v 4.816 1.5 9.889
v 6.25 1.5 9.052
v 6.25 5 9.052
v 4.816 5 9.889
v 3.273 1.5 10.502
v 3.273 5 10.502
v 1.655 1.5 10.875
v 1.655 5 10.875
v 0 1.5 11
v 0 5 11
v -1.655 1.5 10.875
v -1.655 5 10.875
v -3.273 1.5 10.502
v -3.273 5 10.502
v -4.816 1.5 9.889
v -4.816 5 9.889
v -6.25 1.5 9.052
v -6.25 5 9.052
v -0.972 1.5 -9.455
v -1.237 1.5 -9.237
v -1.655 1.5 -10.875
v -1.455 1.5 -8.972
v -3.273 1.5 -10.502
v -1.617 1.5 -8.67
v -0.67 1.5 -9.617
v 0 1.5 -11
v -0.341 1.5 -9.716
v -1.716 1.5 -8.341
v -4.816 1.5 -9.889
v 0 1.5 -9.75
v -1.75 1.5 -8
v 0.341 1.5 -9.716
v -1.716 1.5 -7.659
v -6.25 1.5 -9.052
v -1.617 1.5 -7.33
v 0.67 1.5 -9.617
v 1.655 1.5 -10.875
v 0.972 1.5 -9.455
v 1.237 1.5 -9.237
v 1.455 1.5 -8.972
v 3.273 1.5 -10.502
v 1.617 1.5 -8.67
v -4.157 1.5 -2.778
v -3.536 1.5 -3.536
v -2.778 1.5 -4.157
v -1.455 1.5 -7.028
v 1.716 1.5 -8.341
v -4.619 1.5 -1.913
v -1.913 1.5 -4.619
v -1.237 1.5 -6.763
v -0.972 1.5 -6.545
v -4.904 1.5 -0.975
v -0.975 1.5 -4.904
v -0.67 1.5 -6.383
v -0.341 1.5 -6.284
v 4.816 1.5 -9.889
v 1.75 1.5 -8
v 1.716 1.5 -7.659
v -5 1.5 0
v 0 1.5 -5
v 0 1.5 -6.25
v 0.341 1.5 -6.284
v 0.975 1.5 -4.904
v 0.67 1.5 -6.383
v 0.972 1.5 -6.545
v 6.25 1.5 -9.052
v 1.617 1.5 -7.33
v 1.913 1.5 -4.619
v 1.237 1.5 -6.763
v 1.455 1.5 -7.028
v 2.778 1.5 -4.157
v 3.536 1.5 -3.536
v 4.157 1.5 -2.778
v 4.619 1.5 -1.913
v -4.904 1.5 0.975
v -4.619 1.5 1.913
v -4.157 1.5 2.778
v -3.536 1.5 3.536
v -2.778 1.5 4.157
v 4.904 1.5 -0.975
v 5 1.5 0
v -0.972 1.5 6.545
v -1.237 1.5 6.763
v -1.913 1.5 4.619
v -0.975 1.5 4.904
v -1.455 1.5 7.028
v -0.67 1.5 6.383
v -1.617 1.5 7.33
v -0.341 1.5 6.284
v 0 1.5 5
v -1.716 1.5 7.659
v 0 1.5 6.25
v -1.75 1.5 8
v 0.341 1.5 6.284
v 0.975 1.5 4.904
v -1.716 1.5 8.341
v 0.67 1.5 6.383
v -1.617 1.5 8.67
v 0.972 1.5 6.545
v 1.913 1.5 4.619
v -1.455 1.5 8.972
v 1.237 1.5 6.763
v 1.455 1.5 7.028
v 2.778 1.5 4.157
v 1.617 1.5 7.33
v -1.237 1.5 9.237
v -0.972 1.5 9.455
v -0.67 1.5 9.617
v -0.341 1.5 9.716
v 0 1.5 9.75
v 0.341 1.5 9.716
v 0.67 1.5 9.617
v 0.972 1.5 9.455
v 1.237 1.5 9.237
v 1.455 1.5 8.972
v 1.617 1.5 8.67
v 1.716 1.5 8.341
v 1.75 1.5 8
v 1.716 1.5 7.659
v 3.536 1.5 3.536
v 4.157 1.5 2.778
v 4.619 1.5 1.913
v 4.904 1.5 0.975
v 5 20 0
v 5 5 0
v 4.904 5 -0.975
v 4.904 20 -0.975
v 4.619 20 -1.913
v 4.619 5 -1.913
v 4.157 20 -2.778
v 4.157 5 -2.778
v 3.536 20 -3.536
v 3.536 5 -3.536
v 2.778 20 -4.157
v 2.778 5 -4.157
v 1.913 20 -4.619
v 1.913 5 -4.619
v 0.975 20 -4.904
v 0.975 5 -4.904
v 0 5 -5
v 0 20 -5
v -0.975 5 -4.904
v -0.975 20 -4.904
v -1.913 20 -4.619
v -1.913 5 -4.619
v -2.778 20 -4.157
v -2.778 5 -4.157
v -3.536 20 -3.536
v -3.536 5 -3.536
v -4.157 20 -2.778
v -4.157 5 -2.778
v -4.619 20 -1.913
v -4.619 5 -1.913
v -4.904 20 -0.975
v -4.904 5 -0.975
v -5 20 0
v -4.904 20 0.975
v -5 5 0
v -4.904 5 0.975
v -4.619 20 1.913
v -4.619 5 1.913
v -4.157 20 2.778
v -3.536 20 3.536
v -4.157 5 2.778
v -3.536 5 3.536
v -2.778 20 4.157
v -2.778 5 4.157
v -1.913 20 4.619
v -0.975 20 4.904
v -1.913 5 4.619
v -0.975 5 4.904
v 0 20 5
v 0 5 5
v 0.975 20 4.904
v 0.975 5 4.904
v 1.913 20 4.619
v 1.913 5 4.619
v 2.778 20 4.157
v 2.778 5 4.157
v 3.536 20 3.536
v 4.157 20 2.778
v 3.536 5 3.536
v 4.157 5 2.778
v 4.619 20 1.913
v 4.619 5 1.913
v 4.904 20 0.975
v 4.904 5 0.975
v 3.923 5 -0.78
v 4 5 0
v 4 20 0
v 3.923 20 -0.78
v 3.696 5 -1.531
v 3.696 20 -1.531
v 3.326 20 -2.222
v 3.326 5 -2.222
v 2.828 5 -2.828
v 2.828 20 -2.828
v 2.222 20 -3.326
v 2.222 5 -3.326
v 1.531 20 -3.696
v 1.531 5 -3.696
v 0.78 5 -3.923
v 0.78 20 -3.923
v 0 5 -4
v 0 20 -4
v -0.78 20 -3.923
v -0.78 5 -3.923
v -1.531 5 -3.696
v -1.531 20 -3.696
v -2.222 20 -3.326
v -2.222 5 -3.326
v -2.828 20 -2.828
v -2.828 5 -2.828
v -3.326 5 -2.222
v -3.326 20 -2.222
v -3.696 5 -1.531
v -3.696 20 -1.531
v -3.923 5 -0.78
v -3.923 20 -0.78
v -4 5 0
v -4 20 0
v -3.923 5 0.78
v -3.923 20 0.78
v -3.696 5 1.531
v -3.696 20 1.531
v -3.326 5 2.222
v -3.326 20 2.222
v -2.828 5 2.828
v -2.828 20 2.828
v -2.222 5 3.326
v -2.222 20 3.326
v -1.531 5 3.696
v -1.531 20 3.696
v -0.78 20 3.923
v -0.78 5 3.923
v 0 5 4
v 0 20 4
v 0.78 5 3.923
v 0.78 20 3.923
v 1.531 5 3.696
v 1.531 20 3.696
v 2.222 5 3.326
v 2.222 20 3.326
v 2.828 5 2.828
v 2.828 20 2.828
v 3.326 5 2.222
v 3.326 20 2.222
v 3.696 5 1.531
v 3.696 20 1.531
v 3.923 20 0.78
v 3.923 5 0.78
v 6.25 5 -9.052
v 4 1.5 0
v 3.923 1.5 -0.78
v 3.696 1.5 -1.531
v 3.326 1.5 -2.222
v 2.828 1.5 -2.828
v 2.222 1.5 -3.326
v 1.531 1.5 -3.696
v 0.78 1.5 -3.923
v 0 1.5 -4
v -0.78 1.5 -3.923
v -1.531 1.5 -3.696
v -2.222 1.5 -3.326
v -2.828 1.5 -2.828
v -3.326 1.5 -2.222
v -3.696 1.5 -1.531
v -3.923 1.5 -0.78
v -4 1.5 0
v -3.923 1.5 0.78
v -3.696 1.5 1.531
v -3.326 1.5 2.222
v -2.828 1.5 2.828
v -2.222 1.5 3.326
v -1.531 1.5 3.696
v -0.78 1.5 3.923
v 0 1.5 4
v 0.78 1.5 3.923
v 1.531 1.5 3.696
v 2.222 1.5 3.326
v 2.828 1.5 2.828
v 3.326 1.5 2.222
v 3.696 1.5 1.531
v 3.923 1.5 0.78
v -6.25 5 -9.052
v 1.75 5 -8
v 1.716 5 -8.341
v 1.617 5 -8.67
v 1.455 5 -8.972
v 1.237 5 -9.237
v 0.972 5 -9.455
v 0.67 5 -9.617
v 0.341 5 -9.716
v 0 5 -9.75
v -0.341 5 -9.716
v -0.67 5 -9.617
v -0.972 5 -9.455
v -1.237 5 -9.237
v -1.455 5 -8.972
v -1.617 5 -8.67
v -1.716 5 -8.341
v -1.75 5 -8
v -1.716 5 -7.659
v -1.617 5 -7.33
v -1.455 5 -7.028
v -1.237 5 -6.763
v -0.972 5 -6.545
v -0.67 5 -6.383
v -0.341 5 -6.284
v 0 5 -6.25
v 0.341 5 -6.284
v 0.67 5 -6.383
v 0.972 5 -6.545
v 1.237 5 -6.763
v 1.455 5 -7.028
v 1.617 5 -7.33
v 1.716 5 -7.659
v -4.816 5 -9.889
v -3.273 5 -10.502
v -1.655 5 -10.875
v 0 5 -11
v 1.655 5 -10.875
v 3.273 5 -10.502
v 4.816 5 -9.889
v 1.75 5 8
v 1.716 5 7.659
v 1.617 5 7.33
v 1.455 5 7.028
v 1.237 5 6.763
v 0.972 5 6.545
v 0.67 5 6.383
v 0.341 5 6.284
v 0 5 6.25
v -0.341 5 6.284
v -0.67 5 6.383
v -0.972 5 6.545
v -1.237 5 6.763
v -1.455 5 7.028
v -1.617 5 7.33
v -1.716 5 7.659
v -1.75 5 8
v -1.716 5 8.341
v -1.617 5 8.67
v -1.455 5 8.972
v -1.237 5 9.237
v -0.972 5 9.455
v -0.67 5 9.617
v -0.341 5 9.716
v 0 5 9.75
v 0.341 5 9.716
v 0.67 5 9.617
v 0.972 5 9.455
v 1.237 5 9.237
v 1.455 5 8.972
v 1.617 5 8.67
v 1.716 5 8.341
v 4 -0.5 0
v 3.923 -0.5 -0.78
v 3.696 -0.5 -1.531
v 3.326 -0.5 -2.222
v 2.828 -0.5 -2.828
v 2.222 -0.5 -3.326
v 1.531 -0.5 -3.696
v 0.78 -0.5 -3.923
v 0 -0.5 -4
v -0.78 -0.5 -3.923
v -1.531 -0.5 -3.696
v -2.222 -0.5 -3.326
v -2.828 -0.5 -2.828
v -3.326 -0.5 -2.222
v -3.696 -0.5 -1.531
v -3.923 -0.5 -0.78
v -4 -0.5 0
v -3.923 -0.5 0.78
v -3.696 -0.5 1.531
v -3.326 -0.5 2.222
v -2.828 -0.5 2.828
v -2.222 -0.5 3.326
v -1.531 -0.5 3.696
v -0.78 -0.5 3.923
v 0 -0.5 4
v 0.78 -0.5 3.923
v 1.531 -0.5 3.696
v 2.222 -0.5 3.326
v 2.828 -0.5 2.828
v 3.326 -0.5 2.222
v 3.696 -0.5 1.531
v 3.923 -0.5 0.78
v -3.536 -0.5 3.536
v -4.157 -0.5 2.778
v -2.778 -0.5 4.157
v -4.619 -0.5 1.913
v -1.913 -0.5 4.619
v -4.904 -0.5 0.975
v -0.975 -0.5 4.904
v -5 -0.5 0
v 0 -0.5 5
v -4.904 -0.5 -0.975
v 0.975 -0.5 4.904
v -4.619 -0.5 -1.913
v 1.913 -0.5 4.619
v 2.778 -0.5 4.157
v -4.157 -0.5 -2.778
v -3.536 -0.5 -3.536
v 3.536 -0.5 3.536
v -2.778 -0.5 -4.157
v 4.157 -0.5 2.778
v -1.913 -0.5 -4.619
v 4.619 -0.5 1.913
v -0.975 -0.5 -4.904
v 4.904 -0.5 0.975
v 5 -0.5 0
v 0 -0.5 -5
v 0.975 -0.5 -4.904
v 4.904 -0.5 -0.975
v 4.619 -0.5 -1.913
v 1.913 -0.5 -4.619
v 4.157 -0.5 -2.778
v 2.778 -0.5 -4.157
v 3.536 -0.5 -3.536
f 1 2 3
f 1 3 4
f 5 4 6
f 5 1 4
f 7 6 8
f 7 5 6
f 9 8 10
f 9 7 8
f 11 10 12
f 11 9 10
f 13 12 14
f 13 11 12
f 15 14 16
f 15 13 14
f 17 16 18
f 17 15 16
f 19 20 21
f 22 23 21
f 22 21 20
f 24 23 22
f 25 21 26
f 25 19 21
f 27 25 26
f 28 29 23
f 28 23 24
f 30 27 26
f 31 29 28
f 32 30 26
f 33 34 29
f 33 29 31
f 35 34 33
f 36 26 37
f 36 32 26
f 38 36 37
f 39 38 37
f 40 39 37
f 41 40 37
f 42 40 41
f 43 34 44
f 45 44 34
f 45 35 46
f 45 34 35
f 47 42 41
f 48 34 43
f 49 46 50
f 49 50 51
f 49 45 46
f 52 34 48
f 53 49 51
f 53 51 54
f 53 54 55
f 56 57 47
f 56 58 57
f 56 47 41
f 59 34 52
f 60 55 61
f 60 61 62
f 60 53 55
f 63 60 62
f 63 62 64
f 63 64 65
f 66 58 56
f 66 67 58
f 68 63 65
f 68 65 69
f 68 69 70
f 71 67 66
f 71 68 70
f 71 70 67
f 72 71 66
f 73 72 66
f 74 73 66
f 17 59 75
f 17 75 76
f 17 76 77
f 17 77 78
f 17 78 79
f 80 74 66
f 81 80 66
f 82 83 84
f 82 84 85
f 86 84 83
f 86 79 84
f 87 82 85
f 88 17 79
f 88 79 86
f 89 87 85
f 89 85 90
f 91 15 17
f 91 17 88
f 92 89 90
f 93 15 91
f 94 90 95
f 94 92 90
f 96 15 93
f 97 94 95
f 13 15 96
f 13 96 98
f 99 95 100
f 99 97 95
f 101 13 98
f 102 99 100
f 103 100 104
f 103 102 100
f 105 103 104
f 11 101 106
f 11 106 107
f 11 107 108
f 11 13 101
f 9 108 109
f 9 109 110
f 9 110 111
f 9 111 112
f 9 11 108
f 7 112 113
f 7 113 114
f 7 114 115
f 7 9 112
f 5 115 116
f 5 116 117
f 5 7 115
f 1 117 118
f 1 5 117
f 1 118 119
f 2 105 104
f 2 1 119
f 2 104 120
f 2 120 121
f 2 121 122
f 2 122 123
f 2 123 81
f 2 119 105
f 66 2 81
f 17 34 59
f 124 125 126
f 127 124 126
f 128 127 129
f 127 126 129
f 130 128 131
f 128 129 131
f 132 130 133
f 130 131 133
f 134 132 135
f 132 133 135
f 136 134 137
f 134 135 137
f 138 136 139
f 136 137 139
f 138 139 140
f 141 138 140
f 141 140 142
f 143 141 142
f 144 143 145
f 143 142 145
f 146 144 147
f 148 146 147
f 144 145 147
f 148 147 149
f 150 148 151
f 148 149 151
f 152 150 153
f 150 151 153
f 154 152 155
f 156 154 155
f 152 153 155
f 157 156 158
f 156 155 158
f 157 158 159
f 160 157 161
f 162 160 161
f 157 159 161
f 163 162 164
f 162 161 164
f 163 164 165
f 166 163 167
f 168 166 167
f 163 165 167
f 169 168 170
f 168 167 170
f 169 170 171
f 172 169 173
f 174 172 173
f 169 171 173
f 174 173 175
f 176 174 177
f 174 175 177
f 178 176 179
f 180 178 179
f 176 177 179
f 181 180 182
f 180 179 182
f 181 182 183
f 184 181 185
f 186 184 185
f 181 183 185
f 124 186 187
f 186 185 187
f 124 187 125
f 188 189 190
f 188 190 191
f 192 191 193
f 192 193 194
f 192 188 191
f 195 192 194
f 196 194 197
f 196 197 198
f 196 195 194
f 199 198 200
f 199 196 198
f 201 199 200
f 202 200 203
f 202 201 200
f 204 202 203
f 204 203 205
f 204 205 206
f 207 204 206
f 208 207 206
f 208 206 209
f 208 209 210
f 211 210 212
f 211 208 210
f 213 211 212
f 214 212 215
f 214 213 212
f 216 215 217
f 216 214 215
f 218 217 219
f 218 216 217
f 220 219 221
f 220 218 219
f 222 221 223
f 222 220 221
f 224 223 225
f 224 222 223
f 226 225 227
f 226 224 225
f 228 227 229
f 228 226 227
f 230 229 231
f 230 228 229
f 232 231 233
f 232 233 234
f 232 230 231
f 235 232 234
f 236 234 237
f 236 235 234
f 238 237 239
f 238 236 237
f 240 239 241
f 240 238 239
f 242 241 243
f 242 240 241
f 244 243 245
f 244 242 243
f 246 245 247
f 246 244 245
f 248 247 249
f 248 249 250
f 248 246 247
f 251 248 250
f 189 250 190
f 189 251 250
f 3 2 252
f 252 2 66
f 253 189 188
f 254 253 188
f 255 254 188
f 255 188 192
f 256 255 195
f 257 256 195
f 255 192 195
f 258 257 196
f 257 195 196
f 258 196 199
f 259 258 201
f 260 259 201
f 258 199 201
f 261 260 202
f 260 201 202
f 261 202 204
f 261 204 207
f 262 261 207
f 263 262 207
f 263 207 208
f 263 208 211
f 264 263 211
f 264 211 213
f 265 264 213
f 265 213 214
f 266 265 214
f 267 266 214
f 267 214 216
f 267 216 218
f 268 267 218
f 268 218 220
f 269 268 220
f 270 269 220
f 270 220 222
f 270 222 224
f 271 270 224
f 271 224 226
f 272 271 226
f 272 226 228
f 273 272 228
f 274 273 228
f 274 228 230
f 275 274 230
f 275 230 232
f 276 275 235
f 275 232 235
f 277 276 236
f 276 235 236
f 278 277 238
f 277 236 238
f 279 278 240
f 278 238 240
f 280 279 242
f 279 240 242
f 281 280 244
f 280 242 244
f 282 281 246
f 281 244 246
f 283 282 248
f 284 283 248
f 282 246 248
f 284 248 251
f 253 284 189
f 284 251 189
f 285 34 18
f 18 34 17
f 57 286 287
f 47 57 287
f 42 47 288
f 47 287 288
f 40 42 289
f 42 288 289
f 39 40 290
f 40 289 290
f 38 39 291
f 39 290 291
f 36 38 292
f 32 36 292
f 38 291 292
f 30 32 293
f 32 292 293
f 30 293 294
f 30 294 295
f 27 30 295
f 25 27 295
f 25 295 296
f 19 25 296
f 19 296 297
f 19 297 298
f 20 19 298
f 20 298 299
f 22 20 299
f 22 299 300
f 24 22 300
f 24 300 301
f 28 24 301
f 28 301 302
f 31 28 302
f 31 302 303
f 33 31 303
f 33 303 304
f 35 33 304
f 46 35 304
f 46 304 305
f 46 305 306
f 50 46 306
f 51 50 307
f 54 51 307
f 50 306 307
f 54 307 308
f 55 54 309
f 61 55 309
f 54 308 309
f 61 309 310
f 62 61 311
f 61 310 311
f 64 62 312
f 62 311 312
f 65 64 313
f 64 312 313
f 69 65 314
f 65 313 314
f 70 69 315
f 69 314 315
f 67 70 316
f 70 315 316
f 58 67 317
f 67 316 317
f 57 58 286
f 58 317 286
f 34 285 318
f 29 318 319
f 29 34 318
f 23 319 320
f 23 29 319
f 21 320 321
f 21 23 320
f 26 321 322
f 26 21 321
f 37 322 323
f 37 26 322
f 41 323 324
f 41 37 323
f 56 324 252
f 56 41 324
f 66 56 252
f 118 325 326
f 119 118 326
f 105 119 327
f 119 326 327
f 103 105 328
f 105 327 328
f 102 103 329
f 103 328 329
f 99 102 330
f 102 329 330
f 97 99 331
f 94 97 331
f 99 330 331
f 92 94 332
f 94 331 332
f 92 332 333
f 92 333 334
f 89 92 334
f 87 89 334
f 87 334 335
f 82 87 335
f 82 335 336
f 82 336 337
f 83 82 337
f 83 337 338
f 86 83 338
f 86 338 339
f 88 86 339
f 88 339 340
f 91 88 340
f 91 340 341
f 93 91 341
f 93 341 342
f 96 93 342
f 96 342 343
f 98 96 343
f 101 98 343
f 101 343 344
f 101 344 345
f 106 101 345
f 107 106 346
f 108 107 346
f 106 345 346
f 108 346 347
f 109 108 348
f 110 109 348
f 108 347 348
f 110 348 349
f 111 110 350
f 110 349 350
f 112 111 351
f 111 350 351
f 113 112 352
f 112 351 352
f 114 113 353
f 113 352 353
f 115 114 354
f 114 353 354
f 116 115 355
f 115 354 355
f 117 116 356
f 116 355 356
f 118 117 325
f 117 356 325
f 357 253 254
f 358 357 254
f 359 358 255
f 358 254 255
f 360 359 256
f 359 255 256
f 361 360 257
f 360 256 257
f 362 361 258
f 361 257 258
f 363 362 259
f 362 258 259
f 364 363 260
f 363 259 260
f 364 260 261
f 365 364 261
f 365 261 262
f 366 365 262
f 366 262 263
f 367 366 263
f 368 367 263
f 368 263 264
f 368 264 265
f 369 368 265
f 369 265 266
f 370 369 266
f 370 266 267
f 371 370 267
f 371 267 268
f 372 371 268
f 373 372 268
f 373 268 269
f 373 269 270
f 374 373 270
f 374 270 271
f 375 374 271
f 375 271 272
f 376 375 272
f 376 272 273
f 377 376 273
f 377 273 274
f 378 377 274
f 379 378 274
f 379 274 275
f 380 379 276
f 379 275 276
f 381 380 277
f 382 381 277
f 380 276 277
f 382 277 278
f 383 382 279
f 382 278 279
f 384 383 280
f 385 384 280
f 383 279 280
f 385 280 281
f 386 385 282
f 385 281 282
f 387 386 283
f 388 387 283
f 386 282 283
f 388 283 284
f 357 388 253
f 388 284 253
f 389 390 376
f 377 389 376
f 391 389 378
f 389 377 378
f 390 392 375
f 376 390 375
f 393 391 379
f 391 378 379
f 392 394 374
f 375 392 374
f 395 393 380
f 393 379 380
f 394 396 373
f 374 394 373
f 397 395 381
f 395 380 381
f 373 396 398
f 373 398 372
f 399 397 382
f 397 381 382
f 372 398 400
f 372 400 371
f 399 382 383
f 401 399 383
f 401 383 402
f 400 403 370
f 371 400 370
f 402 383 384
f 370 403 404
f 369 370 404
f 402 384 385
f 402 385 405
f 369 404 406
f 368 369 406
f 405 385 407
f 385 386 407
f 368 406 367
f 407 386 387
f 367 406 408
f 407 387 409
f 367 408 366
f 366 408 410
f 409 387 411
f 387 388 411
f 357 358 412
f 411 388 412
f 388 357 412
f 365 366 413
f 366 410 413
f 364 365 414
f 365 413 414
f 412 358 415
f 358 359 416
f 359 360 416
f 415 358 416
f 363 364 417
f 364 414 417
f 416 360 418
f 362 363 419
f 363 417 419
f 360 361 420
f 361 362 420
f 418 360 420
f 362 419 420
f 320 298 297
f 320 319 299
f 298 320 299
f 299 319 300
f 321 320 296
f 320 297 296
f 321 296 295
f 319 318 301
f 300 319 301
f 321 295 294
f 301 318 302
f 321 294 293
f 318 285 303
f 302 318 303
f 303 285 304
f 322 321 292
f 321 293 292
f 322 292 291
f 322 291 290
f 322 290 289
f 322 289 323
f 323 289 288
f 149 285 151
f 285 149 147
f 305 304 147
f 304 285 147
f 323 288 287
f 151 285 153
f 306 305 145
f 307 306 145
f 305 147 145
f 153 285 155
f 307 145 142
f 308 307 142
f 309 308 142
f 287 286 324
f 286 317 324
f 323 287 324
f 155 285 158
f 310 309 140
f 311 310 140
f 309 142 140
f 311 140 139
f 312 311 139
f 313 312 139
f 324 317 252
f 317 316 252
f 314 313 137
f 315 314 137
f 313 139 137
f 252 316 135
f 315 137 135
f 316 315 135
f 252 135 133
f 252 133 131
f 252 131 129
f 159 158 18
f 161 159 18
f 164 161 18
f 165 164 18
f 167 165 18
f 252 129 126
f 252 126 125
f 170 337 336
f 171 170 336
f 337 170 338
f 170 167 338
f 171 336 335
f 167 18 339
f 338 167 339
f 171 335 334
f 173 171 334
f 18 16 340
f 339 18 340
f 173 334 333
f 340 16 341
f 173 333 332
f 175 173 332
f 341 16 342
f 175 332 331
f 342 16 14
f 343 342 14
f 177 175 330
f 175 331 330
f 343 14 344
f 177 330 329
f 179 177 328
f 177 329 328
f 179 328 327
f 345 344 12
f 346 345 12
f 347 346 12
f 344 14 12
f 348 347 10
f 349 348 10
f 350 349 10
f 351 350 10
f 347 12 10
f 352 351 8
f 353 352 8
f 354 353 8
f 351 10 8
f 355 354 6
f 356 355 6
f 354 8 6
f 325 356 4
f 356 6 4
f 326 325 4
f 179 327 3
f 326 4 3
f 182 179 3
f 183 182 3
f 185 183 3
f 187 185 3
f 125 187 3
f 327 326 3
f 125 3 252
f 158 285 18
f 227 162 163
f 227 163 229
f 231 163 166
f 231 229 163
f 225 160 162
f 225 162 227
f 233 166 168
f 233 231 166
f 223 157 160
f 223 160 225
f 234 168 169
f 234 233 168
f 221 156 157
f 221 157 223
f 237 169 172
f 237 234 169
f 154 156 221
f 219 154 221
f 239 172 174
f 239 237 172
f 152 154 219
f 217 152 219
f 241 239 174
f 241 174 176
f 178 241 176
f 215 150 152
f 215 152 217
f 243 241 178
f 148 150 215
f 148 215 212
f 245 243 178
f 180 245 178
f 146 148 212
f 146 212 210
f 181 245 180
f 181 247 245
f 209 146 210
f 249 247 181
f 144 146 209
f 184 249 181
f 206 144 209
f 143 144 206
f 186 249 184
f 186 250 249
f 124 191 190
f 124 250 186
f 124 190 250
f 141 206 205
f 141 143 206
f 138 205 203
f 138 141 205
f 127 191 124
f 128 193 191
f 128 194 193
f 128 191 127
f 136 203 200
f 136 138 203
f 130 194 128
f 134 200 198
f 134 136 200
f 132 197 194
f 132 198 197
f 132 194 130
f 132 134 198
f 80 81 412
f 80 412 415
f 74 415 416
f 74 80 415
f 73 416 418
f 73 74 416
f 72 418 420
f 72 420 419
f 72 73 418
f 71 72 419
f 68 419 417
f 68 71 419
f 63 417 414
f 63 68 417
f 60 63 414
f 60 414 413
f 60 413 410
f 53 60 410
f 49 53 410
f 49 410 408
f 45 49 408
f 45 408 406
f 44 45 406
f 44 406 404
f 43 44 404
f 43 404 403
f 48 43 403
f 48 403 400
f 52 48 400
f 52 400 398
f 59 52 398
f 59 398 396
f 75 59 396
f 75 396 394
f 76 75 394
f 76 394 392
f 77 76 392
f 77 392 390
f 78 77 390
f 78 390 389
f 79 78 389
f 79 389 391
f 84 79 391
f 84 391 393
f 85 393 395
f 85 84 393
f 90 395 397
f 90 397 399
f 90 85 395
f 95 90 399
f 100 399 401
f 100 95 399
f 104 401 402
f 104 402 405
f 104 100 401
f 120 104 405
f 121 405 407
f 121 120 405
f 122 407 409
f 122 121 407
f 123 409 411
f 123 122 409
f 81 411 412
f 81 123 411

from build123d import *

# Parameters (mm, degrees)
SKETCH_1_R           = 11
EXTRUDE_1_DEPTH      = 3.5
SKETCH_2_R           = 5
SKETCH_2_R_2         = 4
EXTRUDE_2_DEPTH      = 15
EXTRUDE_2_DEPTH_BACK = 5.5
SKETCH_3_R           = 4
SKETCH_3_R_2         = 1.75
CUT_EXTRUDE_1_DEPTH  = 6.5
CUT_EXTRUDE_2_DEPTH  = 10


with BuildPart() as part:
    # 草图1 → 凸台-拉伸1 (new body)
    with BuildSketch(Plane.XZ.offset(-1.5)):
        Circle(SKETCH_1_R)
    extrude(amount=-EXTRUDE_1_DEPTH)

    # 草图2 → 凸台-拉伸2 (add, two sides)
    with BuildSketch(Plane(origin=(0, 5, 0), x_dir=(1, 0, 0), z_dir=(0, 1, 0))) as extrude_2_sk:
        Circle(SKETCH_2_R)
        Circle(SKETCH_2_R_2, mode=Mode.SUBTRACT)
    extrude(amount=EXTRUDE_2_DEPTH)
    extrude(extrude_2_sk.sketch, amount=-EXTRUDE_2_DEPTH_BACK)

    # 草图3 → 切除-拉伸1 (cut, through all)
    with BuildSketch(Plane(origin=(0, 5, 0), x_dir=(1, 0, 0), z_dir=(0, 1, 0))):
        Circle(SKETCH_3_R)
        with Locations((-8, 0)):
            Circle(SKETCH_3_R_2)
        with Locations((0, 8)):
            Circle(SKETCH_3_R_2)
        with Locations((8, 0)):
            Circle(SKETCH_3_R_2)
        with Locations((0, -8)):
            Circle(SKETCH_3_R_2)
    extrude(amount=-CUT_EXTRUDE_1_DEPTH, mode=Mode.SUBTRACT)

    # 草图4 → 切除-拉伸2 (cut)
    with BuildSketch(Plane.XZ.offset(-1.5)):
        with BuildLine():
            Line((-6.25, -9.051933495), (-6.25, 9.051933495))
            ThreePointArc((-6.25, 9.051933495), (-11, 0), (-6.25, -9.051933495))
        make_face()
        with BuildLine():
            Line((6.25, 9.051933495), (6.25, -9.051933495))
            ThreePointArc((6.25, -9.051933495), (11, 0), (6.25, 9.051933495))
        make_face()
    extrude(amount=-CUT_EXTRUDE_2_DEPTH, mode=Mode.SUBTRACT)


solid = part.part
